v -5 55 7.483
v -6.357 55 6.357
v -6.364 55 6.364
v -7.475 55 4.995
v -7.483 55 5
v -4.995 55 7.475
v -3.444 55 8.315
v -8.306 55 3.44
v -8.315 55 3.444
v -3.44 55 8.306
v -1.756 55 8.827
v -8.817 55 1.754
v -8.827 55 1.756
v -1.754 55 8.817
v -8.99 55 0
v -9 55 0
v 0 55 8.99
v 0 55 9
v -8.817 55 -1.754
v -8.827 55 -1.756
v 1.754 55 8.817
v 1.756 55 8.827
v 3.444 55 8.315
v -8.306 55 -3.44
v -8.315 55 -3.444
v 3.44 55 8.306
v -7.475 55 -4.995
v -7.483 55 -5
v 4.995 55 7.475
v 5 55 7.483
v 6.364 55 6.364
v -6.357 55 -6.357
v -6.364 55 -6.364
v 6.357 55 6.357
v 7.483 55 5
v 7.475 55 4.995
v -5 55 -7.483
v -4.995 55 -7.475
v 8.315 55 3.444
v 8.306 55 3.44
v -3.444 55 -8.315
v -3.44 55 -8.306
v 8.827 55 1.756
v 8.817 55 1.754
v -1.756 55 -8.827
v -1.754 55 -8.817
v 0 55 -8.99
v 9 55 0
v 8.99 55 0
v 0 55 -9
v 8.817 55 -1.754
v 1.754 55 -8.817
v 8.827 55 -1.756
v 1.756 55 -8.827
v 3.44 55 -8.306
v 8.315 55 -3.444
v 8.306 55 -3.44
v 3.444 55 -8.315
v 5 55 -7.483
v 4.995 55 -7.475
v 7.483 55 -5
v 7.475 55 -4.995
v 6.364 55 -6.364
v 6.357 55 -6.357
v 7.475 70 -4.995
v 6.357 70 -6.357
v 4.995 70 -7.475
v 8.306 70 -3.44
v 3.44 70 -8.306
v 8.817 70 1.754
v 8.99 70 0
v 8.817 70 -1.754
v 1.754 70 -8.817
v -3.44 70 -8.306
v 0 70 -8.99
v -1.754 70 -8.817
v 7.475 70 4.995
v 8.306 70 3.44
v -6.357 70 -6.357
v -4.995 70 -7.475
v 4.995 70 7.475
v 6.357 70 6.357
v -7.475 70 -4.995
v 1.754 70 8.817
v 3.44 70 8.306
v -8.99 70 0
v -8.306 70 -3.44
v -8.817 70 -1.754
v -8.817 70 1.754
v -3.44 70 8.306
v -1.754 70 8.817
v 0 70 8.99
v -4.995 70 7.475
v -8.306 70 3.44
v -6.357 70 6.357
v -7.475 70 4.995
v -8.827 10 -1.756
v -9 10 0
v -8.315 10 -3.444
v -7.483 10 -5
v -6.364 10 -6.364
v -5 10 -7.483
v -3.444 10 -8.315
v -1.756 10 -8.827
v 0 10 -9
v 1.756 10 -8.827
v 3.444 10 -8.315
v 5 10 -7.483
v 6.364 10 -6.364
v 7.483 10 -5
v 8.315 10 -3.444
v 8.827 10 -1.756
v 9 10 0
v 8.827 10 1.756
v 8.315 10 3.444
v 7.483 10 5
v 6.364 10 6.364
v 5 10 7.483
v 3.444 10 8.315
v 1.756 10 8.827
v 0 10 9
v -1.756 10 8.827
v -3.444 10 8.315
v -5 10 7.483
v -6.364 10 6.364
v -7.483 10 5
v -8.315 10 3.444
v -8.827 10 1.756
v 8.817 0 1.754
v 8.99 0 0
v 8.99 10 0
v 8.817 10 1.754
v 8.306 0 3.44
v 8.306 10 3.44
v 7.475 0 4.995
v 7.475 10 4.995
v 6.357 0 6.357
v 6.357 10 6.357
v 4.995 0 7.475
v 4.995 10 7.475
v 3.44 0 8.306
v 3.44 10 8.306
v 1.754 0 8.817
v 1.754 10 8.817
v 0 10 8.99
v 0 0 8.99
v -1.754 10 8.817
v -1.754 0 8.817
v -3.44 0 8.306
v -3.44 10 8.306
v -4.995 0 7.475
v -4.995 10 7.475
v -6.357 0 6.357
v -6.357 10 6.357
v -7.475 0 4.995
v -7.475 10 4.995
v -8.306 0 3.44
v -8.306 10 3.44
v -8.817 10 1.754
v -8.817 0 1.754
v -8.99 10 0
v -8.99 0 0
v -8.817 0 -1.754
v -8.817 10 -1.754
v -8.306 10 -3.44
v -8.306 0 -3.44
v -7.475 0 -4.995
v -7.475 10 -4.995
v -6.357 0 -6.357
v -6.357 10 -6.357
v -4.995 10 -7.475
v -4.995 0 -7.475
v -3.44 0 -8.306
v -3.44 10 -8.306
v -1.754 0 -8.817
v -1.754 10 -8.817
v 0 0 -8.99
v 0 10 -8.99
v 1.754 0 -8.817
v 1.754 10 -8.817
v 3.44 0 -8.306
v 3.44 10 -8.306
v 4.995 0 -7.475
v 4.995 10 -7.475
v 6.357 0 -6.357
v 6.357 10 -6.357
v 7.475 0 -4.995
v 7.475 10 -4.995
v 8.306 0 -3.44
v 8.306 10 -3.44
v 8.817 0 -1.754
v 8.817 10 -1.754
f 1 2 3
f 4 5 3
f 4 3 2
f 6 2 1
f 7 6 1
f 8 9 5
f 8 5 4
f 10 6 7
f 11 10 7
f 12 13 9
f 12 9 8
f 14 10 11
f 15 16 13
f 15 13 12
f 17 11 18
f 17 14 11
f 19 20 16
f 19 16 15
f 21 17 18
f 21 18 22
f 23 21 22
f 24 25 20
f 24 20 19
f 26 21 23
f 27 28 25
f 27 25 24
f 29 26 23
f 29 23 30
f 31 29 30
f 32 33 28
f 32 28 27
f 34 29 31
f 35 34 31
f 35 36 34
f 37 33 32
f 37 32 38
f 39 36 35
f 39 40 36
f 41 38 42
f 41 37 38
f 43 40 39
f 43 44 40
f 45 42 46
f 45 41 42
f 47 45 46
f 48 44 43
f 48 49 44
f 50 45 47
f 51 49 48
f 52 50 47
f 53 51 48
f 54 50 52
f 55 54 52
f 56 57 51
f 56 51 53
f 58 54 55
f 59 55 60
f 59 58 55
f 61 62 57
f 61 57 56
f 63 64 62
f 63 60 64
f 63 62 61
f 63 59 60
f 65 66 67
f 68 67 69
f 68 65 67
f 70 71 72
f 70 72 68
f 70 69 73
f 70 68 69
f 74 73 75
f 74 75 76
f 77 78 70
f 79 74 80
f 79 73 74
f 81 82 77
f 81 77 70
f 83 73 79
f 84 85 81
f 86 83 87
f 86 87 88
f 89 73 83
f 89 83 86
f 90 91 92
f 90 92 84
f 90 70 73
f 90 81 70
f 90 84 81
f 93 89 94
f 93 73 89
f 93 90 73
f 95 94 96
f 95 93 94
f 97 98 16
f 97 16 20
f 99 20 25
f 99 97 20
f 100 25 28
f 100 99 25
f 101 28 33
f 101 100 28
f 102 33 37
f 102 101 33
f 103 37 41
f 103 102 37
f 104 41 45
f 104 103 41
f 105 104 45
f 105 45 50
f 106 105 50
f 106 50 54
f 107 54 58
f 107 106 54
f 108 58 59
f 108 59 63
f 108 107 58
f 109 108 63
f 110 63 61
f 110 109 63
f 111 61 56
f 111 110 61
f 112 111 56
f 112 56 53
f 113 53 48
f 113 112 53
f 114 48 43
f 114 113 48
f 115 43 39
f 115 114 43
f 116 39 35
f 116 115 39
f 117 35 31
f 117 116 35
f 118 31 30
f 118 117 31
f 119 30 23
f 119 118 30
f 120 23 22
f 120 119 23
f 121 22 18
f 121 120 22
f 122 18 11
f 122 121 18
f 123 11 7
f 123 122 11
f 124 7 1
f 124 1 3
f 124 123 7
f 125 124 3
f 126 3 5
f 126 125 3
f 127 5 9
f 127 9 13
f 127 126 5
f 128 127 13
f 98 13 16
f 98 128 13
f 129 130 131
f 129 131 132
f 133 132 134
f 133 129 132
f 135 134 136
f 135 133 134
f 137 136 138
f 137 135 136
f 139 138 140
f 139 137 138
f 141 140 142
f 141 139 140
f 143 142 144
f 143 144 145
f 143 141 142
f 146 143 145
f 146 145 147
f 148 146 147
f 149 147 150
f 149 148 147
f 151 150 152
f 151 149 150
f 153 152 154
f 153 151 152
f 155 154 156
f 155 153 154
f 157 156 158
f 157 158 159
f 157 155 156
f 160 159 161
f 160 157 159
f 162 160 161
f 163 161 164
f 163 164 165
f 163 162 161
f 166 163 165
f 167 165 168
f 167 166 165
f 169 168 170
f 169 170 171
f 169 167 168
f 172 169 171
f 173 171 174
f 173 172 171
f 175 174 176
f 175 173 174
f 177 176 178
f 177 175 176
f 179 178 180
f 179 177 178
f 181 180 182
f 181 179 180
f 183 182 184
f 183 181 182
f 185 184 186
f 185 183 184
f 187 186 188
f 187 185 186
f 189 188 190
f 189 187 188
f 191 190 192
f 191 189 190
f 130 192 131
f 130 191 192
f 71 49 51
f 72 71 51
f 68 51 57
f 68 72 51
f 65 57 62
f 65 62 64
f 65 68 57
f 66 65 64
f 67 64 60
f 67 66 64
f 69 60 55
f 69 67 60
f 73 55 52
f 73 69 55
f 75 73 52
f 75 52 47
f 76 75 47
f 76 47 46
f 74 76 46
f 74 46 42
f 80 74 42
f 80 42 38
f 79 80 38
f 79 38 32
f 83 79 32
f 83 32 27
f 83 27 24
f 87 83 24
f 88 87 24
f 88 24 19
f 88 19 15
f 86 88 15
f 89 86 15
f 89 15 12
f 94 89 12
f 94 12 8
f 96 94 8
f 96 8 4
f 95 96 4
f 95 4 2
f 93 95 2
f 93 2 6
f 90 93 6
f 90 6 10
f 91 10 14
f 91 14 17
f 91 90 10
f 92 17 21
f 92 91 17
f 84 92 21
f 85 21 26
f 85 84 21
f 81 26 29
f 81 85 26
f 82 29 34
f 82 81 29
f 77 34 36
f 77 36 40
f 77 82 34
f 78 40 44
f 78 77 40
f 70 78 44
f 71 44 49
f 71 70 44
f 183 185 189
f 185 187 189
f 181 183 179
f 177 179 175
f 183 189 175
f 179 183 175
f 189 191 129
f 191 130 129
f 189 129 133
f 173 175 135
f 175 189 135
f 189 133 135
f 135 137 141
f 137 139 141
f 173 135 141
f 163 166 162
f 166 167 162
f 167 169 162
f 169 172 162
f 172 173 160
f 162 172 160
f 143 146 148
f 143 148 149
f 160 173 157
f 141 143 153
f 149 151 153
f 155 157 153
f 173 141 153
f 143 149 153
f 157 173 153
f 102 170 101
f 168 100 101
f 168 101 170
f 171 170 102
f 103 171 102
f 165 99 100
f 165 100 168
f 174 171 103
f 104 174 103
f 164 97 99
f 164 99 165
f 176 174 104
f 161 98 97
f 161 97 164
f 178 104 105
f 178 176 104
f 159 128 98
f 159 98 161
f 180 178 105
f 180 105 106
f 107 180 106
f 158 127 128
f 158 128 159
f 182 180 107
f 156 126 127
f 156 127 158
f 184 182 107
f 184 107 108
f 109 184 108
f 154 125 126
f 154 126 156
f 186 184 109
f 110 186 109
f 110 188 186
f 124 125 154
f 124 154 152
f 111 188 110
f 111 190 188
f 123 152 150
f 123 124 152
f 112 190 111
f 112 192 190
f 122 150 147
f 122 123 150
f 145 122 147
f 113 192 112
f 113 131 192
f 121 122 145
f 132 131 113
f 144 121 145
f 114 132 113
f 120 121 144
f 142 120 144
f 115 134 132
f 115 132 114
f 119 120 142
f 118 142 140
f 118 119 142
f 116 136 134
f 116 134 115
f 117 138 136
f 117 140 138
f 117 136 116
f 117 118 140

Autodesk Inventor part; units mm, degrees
ref_plane "YZ Plane" through (0, 0, 0) normal (1, 0, 0) x (0, 1, 0)
ref_plane "XZ Plane" through (0, 0, 0) normal (0, 1, 0) x (-1, 0, 0)
ref_plane "XY Plane" through (0, 0, 0) normal (0, 0, 1) x (1, 0, 0)
sketch "Sketch1" plane through (0, 0, 0) normal (0, 1, 0) x (-1, 0, 0)
  circle A0 centre (0, 0) radius 9
  dimension "d0" = 18
extrude "Extrusion1" add sketch "Sketch1" along normal blind 70
sketch "Sketch2" plane through (0, 70, 0) normal (0, 1, 0) x (1, 0, 0)
  circle A0 centre (0, 0) radius 9 projected
  circle A1 centre (0, 0) radius 8.99
  dimension "d3" = 0.01
extrude "Extrusion2" cut sketch "Sketch2" against normal blind 15
sketch "Sketch3" plane through (0, 0, 0) normal (0, -1, 0) x (1, 0, 0)
  circle A0 centre (0, 0) radius 9 projected
  circle A1 centre (0, 0) radius 8.99 projected
extrude "Extrusion3" cut sketch "Sketch3" against normal blind 10
thread "Thread1" size "M18x1" class "6g" standard "ANSI Metric M Profile" full length
properties part number "Inductive Sensor 18mmx70mm"
